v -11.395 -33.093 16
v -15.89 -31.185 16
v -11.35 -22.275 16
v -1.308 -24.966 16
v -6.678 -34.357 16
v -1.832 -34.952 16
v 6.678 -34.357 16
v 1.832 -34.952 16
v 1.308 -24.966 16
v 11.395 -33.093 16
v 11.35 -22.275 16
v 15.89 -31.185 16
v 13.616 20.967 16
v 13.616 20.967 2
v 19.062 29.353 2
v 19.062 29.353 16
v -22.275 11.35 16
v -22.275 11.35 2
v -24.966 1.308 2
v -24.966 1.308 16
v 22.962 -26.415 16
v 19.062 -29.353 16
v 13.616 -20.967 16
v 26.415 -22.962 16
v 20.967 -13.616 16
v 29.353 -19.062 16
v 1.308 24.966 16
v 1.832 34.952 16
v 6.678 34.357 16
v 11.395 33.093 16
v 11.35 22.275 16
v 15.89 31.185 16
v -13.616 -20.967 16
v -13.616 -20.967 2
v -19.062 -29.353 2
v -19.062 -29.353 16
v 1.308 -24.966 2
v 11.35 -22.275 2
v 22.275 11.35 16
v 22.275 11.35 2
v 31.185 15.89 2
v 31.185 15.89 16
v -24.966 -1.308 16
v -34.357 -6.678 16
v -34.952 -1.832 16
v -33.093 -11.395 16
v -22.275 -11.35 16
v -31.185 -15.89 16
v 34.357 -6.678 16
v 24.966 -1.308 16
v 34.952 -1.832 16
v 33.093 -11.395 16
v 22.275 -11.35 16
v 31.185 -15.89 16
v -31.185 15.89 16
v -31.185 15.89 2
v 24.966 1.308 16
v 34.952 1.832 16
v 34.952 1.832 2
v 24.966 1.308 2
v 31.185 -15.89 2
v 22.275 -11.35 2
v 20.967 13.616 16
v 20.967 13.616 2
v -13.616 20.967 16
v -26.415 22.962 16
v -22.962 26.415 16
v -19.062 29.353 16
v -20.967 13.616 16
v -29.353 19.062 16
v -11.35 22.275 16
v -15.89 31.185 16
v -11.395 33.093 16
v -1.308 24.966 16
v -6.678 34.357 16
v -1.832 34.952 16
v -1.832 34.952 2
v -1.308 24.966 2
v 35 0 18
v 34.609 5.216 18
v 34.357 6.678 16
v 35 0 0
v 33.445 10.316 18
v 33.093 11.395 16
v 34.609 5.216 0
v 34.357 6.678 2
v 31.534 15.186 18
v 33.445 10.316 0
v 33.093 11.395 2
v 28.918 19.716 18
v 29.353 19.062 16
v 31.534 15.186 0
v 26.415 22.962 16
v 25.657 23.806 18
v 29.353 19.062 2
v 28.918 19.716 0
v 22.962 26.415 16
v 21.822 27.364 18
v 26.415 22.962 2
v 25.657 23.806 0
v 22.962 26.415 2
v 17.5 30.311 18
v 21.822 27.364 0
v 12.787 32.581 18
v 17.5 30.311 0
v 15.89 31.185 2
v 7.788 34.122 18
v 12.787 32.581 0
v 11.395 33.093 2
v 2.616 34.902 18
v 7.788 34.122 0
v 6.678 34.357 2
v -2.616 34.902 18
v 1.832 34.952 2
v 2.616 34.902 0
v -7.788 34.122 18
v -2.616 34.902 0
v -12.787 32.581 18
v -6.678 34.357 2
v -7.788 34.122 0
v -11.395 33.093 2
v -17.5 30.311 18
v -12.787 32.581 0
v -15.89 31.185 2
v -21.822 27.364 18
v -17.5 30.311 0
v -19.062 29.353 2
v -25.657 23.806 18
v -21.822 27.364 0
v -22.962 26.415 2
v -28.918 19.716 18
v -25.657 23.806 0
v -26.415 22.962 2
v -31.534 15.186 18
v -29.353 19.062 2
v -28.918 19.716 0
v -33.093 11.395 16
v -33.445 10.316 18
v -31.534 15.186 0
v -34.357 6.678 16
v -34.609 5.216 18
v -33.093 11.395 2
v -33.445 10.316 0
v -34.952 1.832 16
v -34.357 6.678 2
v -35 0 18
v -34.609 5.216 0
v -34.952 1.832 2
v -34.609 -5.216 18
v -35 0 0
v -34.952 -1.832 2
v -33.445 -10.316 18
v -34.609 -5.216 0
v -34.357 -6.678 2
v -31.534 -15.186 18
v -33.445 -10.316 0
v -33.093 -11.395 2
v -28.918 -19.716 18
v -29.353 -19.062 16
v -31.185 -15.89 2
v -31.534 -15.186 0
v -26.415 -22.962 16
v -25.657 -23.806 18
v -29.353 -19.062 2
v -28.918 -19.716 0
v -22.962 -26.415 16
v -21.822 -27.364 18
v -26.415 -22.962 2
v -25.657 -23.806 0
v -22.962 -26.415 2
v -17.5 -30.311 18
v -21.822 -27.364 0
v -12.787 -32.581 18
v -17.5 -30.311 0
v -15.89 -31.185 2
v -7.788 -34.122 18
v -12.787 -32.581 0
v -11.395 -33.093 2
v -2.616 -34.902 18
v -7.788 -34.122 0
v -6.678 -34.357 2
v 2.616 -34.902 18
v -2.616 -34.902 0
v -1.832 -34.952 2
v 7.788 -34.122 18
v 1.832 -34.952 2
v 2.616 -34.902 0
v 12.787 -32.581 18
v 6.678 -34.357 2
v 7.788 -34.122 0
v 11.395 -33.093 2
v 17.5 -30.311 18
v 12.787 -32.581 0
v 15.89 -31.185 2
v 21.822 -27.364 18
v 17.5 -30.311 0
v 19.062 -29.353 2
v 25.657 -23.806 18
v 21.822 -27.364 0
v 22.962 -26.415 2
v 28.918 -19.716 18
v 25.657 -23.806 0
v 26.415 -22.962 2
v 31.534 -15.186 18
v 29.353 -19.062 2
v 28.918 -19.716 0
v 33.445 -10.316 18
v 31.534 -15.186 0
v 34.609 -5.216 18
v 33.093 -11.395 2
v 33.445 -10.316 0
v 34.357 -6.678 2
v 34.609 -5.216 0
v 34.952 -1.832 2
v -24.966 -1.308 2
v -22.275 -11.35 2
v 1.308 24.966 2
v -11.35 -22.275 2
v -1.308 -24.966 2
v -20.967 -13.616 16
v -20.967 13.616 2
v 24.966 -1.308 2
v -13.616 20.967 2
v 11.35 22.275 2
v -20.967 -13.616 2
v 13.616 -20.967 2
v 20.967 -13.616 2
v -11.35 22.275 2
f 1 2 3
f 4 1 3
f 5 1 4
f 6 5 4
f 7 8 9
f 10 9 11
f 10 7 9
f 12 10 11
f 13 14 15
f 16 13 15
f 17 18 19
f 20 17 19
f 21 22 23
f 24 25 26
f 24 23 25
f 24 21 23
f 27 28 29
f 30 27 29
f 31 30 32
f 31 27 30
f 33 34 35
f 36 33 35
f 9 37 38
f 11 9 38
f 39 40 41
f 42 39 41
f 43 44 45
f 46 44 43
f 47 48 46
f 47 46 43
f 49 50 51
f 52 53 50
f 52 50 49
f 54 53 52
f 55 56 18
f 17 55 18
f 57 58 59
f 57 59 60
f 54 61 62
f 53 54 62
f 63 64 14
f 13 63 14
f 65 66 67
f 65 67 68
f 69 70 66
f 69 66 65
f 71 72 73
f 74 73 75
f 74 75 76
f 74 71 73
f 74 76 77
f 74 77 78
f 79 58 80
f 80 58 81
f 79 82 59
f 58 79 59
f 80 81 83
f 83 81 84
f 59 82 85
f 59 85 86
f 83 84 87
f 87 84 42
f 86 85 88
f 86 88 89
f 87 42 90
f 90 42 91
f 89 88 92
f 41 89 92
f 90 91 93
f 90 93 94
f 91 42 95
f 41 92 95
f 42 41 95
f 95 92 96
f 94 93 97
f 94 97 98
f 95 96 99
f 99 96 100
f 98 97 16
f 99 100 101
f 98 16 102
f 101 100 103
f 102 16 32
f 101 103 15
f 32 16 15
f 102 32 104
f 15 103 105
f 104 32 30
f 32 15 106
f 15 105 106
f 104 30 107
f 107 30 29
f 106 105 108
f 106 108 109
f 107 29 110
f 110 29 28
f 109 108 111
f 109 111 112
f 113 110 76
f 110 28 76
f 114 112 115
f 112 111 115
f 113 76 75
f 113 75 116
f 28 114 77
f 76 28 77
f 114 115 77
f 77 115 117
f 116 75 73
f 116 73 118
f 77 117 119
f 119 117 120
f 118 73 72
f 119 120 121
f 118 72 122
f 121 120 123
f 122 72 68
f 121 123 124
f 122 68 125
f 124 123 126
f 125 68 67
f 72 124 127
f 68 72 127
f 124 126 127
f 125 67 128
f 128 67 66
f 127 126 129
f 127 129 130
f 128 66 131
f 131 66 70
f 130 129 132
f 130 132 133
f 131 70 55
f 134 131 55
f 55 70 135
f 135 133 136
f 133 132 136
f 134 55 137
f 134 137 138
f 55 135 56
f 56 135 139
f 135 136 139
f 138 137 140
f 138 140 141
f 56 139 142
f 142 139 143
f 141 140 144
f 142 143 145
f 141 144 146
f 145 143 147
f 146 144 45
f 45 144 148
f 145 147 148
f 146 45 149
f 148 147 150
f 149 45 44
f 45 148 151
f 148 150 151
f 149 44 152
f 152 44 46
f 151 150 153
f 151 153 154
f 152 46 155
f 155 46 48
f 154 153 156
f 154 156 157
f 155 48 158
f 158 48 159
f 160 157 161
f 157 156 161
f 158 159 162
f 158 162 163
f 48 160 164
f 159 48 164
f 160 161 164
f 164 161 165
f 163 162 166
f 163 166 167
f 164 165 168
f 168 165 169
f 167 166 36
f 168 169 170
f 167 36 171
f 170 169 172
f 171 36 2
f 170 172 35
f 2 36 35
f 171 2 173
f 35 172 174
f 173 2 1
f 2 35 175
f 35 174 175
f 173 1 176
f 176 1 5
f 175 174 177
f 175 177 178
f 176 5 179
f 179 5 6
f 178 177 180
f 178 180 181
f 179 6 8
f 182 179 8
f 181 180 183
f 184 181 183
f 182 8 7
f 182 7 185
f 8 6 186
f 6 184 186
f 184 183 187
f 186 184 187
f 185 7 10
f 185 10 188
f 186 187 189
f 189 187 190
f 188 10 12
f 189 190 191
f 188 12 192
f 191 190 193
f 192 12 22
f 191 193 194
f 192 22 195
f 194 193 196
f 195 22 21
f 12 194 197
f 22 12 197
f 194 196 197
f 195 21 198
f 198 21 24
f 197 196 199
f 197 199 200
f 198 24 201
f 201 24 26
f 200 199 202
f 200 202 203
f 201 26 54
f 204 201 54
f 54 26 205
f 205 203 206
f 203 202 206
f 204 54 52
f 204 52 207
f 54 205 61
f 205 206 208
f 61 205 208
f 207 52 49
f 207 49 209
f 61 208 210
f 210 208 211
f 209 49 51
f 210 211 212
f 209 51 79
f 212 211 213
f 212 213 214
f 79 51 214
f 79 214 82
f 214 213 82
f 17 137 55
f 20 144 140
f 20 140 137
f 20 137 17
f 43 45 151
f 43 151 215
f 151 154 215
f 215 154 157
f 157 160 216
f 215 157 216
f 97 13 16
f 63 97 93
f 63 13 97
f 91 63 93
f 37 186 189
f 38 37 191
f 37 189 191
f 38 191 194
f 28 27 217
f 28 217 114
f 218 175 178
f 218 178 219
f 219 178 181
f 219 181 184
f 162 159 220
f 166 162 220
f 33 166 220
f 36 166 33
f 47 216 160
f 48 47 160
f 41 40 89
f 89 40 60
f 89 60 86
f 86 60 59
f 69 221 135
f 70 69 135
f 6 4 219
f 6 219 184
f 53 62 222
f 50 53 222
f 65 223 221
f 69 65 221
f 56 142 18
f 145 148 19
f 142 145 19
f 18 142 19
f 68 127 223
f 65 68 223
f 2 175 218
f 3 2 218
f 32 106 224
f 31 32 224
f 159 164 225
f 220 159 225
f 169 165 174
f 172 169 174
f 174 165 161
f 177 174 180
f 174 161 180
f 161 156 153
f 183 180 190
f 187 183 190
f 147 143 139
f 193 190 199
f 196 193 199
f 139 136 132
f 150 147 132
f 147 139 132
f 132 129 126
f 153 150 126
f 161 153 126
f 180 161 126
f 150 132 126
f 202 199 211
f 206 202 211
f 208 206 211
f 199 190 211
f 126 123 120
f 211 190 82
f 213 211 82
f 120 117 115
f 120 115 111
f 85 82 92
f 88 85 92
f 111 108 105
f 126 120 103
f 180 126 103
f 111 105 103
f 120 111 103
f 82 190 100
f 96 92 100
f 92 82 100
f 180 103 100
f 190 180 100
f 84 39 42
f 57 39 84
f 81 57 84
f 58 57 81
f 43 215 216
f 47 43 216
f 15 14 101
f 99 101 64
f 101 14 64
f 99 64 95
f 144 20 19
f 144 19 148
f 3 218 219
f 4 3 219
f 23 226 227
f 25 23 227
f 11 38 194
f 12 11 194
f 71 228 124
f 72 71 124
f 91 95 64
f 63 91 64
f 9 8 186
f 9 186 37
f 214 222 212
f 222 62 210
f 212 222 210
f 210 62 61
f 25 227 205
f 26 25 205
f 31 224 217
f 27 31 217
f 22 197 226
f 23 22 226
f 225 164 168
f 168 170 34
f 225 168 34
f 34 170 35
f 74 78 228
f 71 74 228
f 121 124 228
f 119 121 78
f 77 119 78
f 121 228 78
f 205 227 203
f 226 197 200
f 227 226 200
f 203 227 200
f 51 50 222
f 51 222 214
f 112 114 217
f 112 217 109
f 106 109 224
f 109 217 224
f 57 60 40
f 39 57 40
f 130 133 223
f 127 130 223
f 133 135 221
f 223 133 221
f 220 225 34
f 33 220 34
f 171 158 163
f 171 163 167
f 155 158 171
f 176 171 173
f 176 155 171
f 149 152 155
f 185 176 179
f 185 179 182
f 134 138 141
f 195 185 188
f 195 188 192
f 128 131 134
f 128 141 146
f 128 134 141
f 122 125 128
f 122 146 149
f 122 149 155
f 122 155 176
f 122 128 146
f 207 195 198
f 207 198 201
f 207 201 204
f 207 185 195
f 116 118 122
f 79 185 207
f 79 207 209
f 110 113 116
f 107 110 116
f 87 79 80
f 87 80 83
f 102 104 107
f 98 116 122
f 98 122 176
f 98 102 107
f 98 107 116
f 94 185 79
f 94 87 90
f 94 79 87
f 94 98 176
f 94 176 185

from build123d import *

# Parameters (mm, degrees)
F0_R     = 35
F1_DEPTH = 18
F3_DEPTH = 16
F4_R     = 35
F5_DEPTH = 2


with BuildPart() as f1:
    # F0 (on Top) → F1 (new body)
    with BuildSketch(Plane.XY):
        Circle(F0_R)
    extrude(amount=F1_DEPTH)

    # F2 (on face) → F3 (cut)
    with BuildSketch(Plane(origin=(0, 0, 0), x_dir=(1, 0, 0), z_dir=(0, 0, -1))):
        with BuildLine():
            Line((11.3497624935, 22.2751631047), (15.8896674909, 31.1852283466))
            ThreePointArc((15.8896674909, 31.1852283466), (9.0586665786, 33.8074039201), (1.8317584685, 34.9520337164))
            Line((1.8317584685, 34.9520337164), (1.3083989061, 24.9657383689))
            Line((1.3083989061, 24.9657383689), (11.3497624935, 22.2751631047))
        make_face()
        with BuildLine():
            Line((20.9667641986, 13.6159758754), (29.3534698781, 19.0623662255))
            ThreePointArc((29.3534698781, 19.0623662255), (24.7487373415, 24.7487373415), (19.0623662255, 29.3534698781))
            Line((19.0623662255, 29.3534698781), (13.6159758754, 20.9667641986))
            Line((13.6159758754, 20.9667641986), (20.9667641986, 13.6159758754))
        make_face()
        with BuildLine():
            Line((24.9657383689, 1.3083989061), (34.9520337164, 1.8317584685))
            ThreePointArc((34.9520337164, 1.8317584685), (33.8074039201, 9.0586665786), (31.1852283466, 15.8896674909))
            Line((31.1852283466, 15.8896674909), (22.2751631047, 11.3497624935))
            Line((22.2751631047, 11.3497624935), (24.9657383689, 1.3083989061))
        make_face()
        with BuildLine():
            ThreePointArc((-31.1852283466, 15.8896674909), (-33.8074039201, 9.0586665786), (-34.9520337164, 1.8317584685))
            Line((-34.9520337164, 1.8317584685), (-24.9657383689, 1.3083989061))
            Line((-24.9657383689, 1.3083989061), (-22.2751631047, 11.3497624935))
            Line((-22.2751631047, 11.3497624935), (-31.1852283466, 15.8896674909))
        make_face()
        with BuildLine():
            ThreePointArc((-19.0623662255, 29.3534698781), (-24.7487373415, 24.7487373415), (-29.3534698781, 19.0623662255))
            Line((-29.3534698781, 19.0623662255), (-20.9667641986, 13.6159758754))
            Line((-20.9667641986, 13.6159758754), (-13.6159758754, 20.9667641986))
            Line((-13.6159758754, 20.9667641986), (-19.0623662255, 29.3534698781))
        make_face()
        with BuildLine():
            ThreePointArc((-1.8317584685, 34.9520337164), (-9.0586665786, 33.8074039201), (-15.8896674909, 31.1852283466))
            Line((-15.8896674909, 31.1852283466), (-11.3497624935, 22.2751631047))
            Line((-11.3497624935, 22.2751631047), (-1.3083989061, 24.9657383689))
            Line((-1.3083989061, 24.9657383689), (-1.8317584685, 34.9520337164))
        make_face()
        with BuildLine():
            ThreePointArc((-15.8896674909, -31.1852283466), (-9.0586665786, -33.8074039201), (-1.8317584685, -34.9520337164))
            Line((-1.8317584685, -34.9520337164), (-1.3083989061, -24.9657383689))
            Line((-1.3083989061, -24.9657383689), (-11.3497624935, -22.2751631047))
            Line((-11.3497624935, -22.2751631047), (-15.8896674909, -31.1852283466))
        make_face()
        with BuildLine():
            ThreePointArc((-29.3534698781, -19.0623662255), (-24.7487373415, -24.7487373415), (-19.0623662255, -29.3534698781))
            Line((-19.0623662255, -29.3534698781), (-13.6159758754, -20.9667641986))
            Line((-13.6159758754, -20.9667641986), (-20.9667641986, -13.6159758754))
            Line((-20.9667641986, -13.6159758754), (-29.3534698781, -19.0623662255))
        make_face()
        with BuildLine():
            ThreePointArc((-34.9520337164, -1.8317584685), (-33.8074039201, -9.0586665786), (-31.1852283466, -15.8896674909))
            Line((-31.1852283466, -15.8896674909), (-22.2751631047, -11.3497624935))
            Line((-22.2751631047, -11.3497624935), (-24.9657383689, -1.3083989061))
            Line((-24.9657383689, -1.3083989061), (-34.9520337164, -1.8317584685))
        make_face()
        with BuildLine():
            ThreePointArc((31.1852283466, -15.8896674909), (33.8074039201, -9.0586665786), (34.9520337164, -1.8317584685))
            Line((34.9520337164, -1.8317584685), (24.9657383689, -1.3083989061))
            Line((24.9657383689, -1.3083989061), (22.2751631047, -11.3497624935))
            Line((22.2751631047, -11.3497624935), (31.1852283466, -15.8896674909))
        make_face()
        with BuildLine():
            ThreePointArc((19.0623662255, -29.3534698781), (24.7487373415, -24.7487373415), (29.3534698781, -19.0623662255))
            Line((29.3534698781, -19.0623662255), (20.9667641986, -13.6159758754))
            Line((20.9667641986, -13.6159758754), (13.6159758754, -20.9667641986))
            Line((13.6159758754, -20.9667641986), (19.0623662255, -29.3534698781))
        make_face()
        with BuildLine():
            ThreePointArc((1.8317584685, -34.9520337164), (9.0586665786, -33.8074039201), (15.8896674909, -31.1852283466))
            Line((15.8896674909, -31.1852283466), (11.3497624935, -22.2751631047))
            Line((11.3497624935, -22.2751631047), (1.3083989061, -24.9657383689))
            Line((1.3083989061, -24.9657383689), (1.8317584685, -34.9520337164))
        make_face()
    extrude(amount=-F3_DEPTH, mode=Mode.SUBTRACT)

    # F4 (on face) → F5 (join)
    with BuildSketch(Plane(origin=(0, 0, 0), x_dir=(1, 0, 0), z_dir=(0, 0, -1))):
        Circle(F4_R)
    extrude(amount=-F5_DEPTH)


solid = f1.part
